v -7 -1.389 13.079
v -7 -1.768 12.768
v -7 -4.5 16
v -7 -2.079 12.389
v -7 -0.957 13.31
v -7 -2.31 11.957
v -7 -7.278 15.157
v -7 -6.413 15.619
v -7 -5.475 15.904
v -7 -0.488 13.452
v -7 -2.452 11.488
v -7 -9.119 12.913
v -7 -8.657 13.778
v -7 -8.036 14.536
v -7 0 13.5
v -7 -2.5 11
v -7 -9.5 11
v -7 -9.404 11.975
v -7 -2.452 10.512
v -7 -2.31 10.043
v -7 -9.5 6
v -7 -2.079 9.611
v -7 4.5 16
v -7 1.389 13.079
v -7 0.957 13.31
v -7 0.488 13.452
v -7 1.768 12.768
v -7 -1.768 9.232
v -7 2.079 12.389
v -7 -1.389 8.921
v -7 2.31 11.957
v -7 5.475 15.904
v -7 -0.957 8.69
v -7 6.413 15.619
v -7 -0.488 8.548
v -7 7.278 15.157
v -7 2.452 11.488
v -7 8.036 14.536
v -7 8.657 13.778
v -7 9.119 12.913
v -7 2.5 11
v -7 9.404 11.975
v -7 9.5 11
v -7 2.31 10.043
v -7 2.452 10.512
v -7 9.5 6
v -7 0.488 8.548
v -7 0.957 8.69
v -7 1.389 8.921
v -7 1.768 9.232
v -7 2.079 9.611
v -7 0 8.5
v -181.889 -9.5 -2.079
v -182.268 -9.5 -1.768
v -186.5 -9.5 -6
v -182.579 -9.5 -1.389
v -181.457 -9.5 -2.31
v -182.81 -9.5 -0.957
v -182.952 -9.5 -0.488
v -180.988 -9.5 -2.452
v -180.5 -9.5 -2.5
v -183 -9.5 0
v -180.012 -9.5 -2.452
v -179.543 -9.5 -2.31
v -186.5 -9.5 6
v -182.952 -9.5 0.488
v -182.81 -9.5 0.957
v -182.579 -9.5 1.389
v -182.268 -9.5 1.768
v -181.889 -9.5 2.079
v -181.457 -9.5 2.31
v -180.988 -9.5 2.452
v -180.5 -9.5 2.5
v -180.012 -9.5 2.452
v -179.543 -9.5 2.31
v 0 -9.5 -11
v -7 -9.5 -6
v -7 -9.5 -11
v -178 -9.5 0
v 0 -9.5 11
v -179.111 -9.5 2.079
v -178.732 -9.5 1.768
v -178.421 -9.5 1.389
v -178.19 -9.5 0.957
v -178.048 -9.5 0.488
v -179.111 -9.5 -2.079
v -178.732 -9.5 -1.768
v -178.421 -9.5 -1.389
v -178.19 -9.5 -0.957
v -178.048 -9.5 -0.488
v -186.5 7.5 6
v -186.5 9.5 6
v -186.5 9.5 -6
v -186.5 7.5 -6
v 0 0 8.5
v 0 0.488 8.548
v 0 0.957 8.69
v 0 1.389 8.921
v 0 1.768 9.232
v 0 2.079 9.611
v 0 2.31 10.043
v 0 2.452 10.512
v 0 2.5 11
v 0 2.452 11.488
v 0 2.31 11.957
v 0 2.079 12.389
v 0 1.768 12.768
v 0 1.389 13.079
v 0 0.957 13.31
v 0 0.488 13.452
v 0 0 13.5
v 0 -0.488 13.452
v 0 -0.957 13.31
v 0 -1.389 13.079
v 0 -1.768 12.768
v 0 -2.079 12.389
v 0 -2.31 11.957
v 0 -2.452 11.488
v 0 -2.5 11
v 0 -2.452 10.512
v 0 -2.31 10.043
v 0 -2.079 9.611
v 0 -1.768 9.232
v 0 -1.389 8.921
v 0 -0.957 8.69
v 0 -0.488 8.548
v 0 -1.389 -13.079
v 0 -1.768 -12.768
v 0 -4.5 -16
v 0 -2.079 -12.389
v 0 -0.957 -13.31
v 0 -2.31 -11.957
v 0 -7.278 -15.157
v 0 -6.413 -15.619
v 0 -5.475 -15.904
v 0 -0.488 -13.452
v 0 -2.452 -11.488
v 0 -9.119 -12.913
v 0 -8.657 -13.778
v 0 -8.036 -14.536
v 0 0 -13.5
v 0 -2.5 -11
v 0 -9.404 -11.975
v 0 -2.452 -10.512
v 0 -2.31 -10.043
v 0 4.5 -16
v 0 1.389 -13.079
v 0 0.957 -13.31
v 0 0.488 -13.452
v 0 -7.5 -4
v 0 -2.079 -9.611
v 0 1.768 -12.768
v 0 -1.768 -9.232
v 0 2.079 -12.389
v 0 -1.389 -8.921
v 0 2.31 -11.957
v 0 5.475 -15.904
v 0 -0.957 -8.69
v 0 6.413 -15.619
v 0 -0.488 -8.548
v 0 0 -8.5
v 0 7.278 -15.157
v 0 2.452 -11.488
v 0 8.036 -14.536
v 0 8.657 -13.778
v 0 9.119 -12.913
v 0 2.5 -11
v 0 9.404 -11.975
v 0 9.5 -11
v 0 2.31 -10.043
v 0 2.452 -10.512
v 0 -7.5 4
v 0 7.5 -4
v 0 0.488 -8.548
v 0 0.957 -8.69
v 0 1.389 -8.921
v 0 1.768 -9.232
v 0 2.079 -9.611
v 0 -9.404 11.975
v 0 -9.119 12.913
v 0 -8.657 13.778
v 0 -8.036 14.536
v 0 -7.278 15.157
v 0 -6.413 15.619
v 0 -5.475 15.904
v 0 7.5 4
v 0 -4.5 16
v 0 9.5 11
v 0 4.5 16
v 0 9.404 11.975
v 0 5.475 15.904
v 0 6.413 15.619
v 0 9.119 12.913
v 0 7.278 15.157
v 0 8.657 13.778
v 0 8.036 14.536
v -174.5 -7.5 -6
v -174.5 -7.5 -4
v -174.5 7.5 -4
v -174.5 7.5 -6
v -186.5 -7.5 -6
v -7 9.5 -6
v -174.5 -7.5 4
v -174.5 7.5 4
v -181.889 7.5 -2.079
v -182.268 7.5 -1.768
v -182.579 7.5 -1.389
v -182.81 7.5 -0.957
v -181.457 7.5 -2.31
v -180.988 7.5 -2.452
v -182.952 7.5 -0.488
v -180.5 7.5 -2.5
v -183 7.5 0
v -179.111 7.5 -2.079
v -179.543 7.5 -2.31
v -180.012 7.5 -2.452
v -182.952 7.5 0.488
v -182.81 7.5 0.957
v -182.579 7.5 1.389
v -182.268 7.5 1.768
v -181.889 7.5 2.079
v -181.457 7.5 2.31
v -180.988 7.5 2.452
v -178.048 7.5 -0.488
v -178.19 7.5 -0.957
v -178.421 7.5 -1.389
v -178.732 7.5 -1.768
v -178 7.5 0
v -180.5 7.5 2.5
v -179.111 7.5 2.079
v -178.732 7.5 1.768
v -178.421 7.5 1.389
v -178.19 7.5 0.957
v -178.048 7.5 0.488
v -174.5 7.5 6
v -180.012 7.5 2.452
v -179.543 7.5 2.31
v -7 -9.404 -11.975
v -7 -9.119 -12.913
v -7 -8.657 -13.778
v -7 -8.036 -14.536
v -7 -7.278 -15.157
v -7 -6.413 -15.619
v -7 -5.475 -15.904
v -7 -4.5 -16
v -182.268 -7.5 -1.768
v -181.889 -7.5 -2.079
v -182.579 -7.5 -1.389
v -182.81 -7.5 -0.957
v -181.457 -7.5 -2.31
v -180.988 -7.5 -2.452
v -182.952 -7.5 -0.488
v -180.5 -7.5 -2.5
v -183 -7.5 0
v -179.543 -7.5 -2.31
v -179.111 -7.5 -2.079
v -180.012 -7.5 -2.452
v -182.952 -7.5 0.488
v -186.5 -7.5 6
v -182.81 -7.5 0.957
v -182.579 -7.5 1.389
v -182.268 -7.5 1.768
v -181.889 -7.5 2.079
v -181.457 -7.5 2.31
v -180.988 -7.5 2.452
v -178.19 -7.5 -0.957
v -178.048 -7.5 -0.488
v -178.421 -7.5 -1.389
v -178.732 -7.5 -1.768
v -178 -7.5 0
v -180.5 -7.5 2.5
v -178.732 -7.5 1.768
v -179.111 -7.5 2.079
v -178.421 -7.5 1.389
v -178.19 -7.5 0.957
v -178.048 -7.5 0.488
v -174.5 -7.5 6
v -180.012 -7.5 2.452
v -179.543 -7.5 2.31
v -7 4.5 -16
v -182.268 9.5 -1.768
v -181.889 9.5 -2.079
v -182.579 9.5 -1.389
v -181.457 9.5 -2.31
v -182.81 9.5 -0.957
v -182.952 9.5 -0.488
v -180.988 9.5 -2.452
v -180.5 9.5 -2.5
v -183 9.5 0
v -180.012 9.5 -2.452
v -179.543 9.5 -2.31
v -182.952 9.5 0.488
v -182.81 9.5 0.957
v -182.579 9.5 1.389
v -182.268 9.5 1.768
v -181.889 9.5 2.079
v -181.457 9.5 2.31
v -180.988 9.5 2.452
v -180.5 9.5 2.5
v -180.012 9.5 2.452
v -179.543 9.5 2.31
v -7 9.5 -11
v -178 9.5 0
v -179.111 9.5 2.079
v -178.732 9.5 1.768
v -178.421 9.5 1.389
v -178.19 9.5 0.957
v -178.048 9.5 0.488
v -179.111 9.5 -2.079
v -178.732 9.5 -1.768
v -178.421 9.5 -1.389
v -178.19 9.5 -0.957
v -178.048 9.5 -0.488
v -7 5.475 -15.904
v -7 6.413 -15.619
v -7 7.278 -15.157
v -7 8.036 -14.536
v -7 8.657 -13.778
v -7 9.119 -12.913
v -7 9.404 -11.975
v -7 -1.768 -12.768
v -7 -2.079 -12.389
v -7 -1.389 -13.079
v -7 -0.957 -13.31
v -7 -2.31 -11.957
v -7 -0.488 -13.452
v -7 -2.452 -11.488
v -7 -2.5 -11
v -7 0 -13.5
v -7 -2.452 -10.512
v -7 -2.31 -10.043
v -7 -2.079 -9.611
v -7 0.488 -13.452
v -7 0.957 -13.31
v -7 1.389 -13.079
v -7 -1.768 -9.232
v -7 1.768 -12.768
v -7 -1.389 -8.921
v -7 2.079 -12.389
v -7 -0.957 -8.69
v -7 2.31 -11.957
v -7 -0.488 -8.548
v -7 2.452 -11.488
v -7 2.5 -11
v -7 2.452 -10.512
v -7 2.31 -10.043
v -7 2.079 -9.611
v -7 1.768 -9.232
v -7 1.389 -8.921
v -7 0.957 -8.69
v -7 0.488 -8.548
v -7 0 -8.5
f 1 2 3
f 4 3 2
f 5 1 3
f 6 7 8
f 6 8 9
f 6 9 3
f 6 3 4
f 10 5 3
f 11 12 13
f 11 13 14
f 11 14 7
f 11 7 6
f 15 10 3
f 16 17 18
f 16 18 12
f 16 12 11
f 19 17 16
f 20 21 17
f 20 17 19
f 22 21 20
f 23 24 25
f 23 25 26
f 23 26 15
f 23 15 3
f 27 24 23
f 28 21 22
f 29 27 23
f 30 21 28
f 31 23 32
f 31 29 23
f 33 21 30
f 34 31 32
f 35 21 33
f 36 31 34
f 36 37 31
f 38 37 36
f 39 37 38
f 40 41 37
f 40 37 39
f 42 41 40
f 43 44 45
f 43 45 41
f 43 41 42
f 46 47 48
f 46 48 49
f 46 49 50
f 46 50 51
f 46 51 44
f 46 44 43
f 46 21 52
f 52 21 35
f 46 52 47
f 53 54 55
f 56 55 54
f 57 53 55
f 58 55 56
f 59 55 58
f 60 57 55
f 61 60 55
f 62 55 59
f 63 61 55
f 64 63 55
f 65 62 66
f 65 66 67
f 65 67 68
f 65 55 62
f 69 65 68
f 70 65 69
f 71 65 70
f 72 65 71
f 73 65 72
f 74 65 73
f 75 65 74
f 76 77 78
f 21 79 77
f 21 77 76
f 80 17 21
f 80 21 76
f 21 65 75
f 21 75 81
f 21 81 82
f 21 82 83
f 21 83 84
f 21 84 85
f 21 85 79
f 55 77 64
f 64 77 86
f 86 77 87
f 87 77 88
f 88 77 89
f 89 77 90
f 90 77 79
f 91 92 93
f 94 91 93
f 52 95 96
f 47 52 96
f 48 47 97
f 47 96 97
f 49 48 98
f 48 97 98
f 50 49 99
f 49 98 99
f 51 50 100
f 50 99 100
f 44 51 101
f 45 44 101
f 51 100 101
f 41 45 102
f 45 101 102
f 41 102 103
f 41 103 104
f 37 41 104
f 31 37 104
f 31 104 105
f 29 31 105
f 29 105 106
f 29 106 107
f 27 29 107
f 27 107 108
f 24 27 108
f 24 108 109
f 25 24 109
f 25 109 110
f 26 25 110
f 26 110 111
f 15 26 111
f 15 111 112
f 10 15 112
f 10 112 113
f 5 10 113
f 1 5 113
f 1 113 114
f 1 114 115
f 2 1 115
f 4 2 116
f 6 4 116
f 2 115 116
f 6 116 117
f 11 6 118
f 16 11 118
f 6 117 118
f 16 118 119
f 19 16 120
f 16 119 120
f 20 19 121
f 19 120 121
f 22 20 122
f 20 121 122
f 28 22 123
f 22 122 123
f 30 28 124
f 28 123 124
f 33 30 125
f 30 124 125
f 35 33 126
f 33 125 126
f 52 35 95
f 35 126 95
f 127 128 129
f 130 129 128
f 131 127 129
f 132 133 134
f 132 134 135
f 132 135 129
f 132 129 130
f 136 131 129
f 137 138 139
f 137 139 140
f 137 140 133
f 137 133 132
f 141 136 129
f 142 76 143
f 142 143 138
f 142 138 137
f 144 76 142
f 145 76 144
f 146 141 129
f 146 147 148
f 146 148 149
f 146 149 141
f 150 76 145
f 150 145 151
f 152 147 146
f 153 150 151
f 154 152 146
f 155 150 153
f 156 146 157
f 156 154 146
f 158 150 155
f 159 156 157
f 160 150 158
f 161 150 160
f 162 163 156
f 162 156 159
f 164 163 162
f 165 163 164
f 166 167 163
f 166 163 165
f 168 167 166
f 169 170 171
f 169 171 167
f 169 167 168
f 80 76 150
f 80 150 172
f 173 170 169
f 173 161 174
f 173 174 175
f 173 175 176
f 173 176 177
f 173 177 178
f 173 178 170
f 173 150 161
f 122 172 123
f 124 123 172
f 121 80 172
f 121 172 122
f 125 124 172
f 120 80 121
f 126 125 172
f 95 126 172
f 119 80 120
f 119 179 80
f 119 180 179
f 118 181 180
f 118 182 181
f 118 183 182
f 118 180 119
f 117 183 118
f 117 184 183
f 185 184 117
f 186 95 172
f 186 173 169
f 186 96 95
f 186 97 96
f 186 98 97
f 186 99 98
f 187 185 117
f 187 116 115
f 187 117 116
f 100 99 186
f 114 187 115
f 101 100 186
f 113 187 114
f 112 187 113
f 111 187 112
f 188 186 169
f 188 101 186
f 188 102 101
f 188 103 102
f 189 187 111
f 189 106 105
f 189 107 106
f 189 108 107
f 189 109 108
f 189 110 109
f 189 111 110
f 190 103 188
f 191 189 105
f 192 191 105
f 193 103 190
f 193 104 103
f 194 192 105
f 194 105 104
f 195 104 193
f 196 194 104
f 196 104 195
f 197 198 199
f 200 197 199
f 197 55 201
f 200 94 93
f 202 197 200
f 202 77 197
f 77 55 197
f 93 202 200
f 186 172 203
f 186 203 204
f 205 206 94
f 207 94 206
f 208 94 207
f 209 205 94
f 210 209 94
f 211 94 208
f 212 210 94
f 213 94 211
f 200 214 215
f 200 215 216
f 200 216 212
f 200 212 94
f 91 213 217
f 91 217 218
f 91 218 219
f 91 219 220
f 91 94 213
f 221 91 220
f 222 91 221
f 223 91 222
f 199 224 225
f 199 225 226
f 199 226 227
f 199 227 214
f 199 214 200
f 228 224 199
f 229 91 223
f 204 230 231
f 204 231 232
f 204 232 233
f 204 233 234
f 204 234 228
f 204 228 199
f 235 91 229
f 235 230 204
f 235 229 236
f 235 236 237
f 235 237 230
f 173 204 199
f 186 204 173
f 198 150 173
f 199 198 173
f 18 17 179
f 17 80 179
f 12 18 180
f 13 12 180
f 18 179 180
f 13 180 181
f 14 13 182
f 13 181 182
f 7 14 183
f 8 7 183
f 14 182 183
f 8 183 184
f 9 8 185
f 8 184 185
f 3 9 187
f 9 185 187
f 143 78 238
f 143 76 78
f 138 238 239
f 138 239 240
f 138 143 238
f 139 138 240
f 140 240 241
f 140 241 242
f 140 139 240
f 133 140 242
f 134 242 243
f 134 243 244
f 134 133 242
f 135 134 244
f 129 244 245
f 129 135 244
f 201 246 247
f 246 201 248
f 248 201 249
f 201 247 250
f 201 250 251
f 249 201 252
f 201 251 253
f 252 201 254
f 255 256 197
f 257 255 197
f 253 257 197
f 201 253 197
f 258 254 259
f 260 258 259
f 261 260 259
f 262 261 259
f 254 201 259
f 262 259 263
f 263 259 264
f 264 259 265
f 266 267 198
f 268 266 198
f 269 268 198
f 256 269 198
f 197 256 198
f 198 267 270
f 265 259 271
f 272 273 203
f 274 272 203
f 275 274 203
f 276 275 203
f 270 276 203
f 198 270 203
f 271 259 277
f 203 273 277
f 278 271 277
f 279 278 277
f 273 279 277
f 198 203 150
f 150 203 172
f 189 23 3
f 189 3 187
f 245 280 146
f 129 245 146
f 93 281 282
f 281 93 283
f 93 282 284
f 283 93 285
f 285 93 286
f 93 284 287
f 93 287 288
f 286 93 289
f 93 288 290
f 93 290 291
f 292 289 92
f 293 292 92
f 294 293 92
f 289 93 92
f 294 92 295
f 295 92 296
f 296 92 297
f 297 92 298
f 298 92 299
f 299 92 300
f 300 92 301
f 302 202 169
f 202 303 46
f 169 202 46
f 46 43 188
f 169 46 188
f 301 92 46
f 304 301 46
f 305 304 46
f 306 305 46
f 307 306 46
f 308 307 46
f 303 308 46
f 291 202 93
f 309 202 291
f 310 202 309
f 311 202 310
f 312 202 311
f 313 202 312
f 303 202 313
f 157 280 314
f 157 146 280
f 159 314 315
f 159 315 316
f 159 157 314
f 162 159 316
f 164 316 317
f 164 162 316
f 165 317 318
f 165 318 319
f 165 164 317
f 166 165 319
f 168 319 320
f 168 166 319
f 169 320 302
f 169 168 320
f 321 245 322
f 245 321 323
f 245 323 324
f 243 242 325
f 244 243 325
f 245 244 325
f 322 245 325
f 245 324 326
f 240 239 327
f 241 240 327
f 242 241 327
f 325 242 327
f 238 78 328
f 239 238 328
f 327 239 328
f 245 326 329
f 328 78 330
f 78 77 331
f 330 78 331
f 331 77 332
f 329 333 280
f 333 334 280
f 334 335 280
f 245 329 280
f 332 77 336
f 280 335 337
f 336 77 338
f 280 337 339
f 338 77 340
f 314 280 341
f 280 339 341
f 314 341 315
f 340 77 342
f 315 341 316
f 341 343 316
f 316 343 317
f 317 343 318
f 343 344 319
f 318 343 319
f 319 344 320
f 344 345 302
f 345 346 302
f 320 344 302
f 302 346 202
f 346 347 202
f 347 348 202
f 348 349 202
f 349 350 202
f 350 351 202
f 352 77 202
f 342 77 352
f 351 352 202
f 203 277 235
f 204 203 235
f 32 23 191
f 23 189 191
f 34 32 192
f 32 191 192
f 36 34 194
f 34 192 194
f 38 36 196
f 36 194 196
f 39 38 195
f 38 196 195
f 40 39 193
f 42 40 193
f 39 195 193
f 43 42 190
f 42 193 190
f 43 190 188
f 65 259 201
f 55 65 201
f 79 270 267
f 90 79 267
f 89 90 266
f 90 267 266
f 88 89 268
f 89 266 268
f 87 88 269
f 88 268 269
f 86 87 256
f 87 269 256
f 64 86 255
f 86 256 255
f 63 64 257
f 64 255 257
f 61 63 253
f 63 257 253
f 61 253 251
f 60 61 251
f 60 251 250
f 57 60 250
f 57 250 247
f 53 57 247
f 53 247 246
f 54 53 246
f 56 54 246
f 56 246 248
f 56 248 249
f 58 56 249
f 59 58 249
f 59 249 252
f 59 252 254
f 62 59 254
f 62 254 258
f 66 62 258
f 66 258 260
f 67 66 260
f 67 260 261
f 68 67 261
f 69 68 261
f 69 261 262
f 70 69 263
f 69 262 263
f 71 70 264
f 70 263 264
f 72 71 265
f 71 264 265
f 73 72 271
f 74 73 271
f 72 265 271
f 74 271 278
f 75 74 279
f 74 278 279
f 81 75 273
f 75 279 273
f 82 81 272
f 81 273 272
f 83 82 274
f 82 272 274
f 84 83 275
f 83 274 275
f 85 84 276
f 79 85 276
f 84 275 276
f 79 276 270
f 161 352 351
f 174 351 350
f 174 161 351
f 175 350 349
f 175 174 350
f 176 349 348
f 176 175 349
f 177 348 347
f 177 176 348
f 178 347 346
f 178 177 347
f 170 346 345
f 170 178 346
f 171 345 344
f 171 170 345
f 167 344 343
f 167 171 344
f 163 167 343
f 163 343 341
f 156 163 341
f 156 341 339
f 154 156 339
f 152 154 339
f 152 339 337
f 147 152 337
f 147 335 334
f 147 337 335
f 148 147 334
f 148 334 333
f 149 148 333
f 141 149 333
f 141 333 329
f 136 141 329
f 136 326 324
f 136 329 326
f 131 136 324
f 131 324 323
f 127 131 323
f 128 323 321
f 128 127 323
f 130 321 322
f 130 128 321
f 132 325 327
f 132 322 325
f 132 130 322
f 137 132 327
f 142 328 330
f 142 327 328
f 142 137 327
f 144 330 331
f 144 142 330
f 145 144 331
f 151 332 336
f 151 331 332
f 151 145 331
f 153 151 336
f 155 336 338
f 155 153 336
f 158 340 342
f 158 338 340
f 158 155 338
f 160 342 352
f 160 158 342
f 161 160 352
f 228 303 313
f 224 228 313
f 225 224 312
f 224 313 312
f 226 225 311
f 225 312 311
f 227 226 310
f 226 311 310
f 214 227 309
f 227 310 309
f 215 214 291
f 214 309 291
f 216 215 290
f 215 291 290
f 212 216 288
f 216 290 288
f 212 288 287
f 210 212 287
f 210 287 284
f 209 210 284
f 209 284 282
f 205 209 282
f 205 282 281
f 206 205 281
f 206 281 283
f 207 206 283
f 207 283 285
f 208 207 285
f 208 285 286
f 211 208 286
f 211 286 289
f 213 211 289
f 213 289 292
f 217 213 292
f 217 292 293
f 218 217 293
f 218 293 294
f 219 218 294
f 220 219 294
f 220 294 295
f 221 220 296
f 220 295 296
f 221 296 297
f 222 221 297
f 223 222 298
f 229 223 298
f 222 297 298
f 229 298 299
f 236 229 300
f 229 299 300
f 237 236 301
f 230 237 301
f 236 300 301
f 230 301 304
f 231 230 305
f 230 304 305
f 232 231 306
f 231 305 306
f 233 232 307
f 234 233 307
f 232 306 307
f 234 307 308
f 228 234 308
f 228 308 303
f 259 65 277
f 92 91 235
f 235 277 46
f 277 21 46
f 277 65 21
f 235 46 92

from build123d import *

# Parameters (mm, degrees)
CROQUIS1_W              = 12
CROQUIS1_H              = 19
CROQUIS1_W_2            = 8
CROQUIS1_H_2            = 15
SALIENTE_EXTRUIR1_DEPTH = 186.5
CROQUIS2_W              = 12
CROQUIS2_H              = 15
CORTAR_EXTRUIR1_DEPTH   = 12
CROQUIS3_R              = 2.5
CORTAR_EXTRUIR2_DEPTH   = 19
SKETCH1_W               = 186.5
SKETCH1_H               = 19
CUT_EXTRUDE1_DEPTH      = 13
SKETCH2_W               = 7
SKETCH2_H               = 19
BOSS_EXTRUDE1_DEPTH     = 10
SKETCH3_R               = 2.5
CUT_EXTRUDE2_DEPTH      = 10
FILLET1_R               = 5
FILLET2_R               = 5


with BuildPart() as part:
    # Croquis1 → Saliente-Extruir1 (new body, symmetric)
    with BuildSketch(Plane(origin=(0, 0, 0), x_dir=(0, 0, -1), z_dir=(1, 0, 0))):
        Rectangle(CROQUIS1_W, CROQUIS1_H)
        Rectangle(CROQUIS1_W_2, CROQUIS1_H_2, mode=Mode.SUBTRACT)
    extrude(amount=SALIENTE_EXTRUIR1_DEPTH, both=True)

    # Croquis2 → Cortar-Extruir1 (cut)
    with BuildSketch(Plane.XY.offset(6)):
        with Locations((-180.5, 0)):
            Rectangle(CROQUIS2_W, CROQUIS2_H)
        with Locations((180.5, 0)):
            Rectangle(CROQUIS2_W, CROQUIS2_H)
    extrude(amount=-CORTAR_EXTRUIR1_DEPTH, mode=Mode.SUBTRACT)

    # Croquis3 → Cortar-Extruir2 (cut)
    with BuildSketch(Plane(origin=(0, 9.5, 0), x_dir=(1, 0, 0), z_dir=(0, 1, 0))):
        with Locations((-180.5, 0)):
            Circle(CROQUIS3_R)
        with Locations((180.5, 0)):
            Circle(CROQUIS3_R)
    extrude(amount=-CORTAR_EXTRUIR2_DEPTH, mode=Mode.SUBTRACT)

    # Sketch1 → Cut-Extrude1 (cut, through all)
    with BuildSketch(Plane.XY.offset(6)):
        with Locations((93.25, 0)):
            Rectangle(SKETCH1_W, SKETCH1_H)
    extrude(amount=-CUT_EXTRUDE1_DEPTH, mode=Mode.SUBTRACT)

    # Sketch2 → Boss-Extrude1 (add)
    with BuildSketch(Plane.XY.offset(6)):
        with Locations((-3.5, 0)):
            Rectangle(SKETCH2_W, SKETCH2_H)
    boss_extrude1 = extrude(amount=BOSS_EXTRUDE1_DEPTH)

    # Sketch3 → Cut-Extrude2 (cut)
    with BuildSketch(Plane(origin=(0, 0, 0), x_dir=(0, 0, -1), z_dir=(1, 0, 0))):
        with Locations((-11, 0)):
            Circle(SKETCH3_R)
    cut_extrude2 = extrude(amount=-CUT_EXTRUDE2_DEPTH, mode=Mode.SUBTRACT)

    # Fillet1
    fillet1_edges = [part.edges().sort_by_distance(p)[0] for p in [
        (-3.5, 9.5, 16),
        (-3.5, -9.5, 16),
    ]]
    fillet(fillet1_edges, radius=FILLET1_R)

    # Mirror1: Boss-Extrude1, Cut-Extrude2 across plane
    add(boss_extrude1.mirror(Plane.XY))
    add(cut_extrude2.mirror(Plane.XY), mode=Mode.SUBTRACT)

    # Fillet2
    fillet2_edges = [part.edges().sort_by_distance(p)[0] for p in [
        (-3.5, -9.5, -16),
        (-3.5, 9.5, -16),
    ]]
    fillet(fillet2_edges, radius=FILLET2_R)


solid = part.part
